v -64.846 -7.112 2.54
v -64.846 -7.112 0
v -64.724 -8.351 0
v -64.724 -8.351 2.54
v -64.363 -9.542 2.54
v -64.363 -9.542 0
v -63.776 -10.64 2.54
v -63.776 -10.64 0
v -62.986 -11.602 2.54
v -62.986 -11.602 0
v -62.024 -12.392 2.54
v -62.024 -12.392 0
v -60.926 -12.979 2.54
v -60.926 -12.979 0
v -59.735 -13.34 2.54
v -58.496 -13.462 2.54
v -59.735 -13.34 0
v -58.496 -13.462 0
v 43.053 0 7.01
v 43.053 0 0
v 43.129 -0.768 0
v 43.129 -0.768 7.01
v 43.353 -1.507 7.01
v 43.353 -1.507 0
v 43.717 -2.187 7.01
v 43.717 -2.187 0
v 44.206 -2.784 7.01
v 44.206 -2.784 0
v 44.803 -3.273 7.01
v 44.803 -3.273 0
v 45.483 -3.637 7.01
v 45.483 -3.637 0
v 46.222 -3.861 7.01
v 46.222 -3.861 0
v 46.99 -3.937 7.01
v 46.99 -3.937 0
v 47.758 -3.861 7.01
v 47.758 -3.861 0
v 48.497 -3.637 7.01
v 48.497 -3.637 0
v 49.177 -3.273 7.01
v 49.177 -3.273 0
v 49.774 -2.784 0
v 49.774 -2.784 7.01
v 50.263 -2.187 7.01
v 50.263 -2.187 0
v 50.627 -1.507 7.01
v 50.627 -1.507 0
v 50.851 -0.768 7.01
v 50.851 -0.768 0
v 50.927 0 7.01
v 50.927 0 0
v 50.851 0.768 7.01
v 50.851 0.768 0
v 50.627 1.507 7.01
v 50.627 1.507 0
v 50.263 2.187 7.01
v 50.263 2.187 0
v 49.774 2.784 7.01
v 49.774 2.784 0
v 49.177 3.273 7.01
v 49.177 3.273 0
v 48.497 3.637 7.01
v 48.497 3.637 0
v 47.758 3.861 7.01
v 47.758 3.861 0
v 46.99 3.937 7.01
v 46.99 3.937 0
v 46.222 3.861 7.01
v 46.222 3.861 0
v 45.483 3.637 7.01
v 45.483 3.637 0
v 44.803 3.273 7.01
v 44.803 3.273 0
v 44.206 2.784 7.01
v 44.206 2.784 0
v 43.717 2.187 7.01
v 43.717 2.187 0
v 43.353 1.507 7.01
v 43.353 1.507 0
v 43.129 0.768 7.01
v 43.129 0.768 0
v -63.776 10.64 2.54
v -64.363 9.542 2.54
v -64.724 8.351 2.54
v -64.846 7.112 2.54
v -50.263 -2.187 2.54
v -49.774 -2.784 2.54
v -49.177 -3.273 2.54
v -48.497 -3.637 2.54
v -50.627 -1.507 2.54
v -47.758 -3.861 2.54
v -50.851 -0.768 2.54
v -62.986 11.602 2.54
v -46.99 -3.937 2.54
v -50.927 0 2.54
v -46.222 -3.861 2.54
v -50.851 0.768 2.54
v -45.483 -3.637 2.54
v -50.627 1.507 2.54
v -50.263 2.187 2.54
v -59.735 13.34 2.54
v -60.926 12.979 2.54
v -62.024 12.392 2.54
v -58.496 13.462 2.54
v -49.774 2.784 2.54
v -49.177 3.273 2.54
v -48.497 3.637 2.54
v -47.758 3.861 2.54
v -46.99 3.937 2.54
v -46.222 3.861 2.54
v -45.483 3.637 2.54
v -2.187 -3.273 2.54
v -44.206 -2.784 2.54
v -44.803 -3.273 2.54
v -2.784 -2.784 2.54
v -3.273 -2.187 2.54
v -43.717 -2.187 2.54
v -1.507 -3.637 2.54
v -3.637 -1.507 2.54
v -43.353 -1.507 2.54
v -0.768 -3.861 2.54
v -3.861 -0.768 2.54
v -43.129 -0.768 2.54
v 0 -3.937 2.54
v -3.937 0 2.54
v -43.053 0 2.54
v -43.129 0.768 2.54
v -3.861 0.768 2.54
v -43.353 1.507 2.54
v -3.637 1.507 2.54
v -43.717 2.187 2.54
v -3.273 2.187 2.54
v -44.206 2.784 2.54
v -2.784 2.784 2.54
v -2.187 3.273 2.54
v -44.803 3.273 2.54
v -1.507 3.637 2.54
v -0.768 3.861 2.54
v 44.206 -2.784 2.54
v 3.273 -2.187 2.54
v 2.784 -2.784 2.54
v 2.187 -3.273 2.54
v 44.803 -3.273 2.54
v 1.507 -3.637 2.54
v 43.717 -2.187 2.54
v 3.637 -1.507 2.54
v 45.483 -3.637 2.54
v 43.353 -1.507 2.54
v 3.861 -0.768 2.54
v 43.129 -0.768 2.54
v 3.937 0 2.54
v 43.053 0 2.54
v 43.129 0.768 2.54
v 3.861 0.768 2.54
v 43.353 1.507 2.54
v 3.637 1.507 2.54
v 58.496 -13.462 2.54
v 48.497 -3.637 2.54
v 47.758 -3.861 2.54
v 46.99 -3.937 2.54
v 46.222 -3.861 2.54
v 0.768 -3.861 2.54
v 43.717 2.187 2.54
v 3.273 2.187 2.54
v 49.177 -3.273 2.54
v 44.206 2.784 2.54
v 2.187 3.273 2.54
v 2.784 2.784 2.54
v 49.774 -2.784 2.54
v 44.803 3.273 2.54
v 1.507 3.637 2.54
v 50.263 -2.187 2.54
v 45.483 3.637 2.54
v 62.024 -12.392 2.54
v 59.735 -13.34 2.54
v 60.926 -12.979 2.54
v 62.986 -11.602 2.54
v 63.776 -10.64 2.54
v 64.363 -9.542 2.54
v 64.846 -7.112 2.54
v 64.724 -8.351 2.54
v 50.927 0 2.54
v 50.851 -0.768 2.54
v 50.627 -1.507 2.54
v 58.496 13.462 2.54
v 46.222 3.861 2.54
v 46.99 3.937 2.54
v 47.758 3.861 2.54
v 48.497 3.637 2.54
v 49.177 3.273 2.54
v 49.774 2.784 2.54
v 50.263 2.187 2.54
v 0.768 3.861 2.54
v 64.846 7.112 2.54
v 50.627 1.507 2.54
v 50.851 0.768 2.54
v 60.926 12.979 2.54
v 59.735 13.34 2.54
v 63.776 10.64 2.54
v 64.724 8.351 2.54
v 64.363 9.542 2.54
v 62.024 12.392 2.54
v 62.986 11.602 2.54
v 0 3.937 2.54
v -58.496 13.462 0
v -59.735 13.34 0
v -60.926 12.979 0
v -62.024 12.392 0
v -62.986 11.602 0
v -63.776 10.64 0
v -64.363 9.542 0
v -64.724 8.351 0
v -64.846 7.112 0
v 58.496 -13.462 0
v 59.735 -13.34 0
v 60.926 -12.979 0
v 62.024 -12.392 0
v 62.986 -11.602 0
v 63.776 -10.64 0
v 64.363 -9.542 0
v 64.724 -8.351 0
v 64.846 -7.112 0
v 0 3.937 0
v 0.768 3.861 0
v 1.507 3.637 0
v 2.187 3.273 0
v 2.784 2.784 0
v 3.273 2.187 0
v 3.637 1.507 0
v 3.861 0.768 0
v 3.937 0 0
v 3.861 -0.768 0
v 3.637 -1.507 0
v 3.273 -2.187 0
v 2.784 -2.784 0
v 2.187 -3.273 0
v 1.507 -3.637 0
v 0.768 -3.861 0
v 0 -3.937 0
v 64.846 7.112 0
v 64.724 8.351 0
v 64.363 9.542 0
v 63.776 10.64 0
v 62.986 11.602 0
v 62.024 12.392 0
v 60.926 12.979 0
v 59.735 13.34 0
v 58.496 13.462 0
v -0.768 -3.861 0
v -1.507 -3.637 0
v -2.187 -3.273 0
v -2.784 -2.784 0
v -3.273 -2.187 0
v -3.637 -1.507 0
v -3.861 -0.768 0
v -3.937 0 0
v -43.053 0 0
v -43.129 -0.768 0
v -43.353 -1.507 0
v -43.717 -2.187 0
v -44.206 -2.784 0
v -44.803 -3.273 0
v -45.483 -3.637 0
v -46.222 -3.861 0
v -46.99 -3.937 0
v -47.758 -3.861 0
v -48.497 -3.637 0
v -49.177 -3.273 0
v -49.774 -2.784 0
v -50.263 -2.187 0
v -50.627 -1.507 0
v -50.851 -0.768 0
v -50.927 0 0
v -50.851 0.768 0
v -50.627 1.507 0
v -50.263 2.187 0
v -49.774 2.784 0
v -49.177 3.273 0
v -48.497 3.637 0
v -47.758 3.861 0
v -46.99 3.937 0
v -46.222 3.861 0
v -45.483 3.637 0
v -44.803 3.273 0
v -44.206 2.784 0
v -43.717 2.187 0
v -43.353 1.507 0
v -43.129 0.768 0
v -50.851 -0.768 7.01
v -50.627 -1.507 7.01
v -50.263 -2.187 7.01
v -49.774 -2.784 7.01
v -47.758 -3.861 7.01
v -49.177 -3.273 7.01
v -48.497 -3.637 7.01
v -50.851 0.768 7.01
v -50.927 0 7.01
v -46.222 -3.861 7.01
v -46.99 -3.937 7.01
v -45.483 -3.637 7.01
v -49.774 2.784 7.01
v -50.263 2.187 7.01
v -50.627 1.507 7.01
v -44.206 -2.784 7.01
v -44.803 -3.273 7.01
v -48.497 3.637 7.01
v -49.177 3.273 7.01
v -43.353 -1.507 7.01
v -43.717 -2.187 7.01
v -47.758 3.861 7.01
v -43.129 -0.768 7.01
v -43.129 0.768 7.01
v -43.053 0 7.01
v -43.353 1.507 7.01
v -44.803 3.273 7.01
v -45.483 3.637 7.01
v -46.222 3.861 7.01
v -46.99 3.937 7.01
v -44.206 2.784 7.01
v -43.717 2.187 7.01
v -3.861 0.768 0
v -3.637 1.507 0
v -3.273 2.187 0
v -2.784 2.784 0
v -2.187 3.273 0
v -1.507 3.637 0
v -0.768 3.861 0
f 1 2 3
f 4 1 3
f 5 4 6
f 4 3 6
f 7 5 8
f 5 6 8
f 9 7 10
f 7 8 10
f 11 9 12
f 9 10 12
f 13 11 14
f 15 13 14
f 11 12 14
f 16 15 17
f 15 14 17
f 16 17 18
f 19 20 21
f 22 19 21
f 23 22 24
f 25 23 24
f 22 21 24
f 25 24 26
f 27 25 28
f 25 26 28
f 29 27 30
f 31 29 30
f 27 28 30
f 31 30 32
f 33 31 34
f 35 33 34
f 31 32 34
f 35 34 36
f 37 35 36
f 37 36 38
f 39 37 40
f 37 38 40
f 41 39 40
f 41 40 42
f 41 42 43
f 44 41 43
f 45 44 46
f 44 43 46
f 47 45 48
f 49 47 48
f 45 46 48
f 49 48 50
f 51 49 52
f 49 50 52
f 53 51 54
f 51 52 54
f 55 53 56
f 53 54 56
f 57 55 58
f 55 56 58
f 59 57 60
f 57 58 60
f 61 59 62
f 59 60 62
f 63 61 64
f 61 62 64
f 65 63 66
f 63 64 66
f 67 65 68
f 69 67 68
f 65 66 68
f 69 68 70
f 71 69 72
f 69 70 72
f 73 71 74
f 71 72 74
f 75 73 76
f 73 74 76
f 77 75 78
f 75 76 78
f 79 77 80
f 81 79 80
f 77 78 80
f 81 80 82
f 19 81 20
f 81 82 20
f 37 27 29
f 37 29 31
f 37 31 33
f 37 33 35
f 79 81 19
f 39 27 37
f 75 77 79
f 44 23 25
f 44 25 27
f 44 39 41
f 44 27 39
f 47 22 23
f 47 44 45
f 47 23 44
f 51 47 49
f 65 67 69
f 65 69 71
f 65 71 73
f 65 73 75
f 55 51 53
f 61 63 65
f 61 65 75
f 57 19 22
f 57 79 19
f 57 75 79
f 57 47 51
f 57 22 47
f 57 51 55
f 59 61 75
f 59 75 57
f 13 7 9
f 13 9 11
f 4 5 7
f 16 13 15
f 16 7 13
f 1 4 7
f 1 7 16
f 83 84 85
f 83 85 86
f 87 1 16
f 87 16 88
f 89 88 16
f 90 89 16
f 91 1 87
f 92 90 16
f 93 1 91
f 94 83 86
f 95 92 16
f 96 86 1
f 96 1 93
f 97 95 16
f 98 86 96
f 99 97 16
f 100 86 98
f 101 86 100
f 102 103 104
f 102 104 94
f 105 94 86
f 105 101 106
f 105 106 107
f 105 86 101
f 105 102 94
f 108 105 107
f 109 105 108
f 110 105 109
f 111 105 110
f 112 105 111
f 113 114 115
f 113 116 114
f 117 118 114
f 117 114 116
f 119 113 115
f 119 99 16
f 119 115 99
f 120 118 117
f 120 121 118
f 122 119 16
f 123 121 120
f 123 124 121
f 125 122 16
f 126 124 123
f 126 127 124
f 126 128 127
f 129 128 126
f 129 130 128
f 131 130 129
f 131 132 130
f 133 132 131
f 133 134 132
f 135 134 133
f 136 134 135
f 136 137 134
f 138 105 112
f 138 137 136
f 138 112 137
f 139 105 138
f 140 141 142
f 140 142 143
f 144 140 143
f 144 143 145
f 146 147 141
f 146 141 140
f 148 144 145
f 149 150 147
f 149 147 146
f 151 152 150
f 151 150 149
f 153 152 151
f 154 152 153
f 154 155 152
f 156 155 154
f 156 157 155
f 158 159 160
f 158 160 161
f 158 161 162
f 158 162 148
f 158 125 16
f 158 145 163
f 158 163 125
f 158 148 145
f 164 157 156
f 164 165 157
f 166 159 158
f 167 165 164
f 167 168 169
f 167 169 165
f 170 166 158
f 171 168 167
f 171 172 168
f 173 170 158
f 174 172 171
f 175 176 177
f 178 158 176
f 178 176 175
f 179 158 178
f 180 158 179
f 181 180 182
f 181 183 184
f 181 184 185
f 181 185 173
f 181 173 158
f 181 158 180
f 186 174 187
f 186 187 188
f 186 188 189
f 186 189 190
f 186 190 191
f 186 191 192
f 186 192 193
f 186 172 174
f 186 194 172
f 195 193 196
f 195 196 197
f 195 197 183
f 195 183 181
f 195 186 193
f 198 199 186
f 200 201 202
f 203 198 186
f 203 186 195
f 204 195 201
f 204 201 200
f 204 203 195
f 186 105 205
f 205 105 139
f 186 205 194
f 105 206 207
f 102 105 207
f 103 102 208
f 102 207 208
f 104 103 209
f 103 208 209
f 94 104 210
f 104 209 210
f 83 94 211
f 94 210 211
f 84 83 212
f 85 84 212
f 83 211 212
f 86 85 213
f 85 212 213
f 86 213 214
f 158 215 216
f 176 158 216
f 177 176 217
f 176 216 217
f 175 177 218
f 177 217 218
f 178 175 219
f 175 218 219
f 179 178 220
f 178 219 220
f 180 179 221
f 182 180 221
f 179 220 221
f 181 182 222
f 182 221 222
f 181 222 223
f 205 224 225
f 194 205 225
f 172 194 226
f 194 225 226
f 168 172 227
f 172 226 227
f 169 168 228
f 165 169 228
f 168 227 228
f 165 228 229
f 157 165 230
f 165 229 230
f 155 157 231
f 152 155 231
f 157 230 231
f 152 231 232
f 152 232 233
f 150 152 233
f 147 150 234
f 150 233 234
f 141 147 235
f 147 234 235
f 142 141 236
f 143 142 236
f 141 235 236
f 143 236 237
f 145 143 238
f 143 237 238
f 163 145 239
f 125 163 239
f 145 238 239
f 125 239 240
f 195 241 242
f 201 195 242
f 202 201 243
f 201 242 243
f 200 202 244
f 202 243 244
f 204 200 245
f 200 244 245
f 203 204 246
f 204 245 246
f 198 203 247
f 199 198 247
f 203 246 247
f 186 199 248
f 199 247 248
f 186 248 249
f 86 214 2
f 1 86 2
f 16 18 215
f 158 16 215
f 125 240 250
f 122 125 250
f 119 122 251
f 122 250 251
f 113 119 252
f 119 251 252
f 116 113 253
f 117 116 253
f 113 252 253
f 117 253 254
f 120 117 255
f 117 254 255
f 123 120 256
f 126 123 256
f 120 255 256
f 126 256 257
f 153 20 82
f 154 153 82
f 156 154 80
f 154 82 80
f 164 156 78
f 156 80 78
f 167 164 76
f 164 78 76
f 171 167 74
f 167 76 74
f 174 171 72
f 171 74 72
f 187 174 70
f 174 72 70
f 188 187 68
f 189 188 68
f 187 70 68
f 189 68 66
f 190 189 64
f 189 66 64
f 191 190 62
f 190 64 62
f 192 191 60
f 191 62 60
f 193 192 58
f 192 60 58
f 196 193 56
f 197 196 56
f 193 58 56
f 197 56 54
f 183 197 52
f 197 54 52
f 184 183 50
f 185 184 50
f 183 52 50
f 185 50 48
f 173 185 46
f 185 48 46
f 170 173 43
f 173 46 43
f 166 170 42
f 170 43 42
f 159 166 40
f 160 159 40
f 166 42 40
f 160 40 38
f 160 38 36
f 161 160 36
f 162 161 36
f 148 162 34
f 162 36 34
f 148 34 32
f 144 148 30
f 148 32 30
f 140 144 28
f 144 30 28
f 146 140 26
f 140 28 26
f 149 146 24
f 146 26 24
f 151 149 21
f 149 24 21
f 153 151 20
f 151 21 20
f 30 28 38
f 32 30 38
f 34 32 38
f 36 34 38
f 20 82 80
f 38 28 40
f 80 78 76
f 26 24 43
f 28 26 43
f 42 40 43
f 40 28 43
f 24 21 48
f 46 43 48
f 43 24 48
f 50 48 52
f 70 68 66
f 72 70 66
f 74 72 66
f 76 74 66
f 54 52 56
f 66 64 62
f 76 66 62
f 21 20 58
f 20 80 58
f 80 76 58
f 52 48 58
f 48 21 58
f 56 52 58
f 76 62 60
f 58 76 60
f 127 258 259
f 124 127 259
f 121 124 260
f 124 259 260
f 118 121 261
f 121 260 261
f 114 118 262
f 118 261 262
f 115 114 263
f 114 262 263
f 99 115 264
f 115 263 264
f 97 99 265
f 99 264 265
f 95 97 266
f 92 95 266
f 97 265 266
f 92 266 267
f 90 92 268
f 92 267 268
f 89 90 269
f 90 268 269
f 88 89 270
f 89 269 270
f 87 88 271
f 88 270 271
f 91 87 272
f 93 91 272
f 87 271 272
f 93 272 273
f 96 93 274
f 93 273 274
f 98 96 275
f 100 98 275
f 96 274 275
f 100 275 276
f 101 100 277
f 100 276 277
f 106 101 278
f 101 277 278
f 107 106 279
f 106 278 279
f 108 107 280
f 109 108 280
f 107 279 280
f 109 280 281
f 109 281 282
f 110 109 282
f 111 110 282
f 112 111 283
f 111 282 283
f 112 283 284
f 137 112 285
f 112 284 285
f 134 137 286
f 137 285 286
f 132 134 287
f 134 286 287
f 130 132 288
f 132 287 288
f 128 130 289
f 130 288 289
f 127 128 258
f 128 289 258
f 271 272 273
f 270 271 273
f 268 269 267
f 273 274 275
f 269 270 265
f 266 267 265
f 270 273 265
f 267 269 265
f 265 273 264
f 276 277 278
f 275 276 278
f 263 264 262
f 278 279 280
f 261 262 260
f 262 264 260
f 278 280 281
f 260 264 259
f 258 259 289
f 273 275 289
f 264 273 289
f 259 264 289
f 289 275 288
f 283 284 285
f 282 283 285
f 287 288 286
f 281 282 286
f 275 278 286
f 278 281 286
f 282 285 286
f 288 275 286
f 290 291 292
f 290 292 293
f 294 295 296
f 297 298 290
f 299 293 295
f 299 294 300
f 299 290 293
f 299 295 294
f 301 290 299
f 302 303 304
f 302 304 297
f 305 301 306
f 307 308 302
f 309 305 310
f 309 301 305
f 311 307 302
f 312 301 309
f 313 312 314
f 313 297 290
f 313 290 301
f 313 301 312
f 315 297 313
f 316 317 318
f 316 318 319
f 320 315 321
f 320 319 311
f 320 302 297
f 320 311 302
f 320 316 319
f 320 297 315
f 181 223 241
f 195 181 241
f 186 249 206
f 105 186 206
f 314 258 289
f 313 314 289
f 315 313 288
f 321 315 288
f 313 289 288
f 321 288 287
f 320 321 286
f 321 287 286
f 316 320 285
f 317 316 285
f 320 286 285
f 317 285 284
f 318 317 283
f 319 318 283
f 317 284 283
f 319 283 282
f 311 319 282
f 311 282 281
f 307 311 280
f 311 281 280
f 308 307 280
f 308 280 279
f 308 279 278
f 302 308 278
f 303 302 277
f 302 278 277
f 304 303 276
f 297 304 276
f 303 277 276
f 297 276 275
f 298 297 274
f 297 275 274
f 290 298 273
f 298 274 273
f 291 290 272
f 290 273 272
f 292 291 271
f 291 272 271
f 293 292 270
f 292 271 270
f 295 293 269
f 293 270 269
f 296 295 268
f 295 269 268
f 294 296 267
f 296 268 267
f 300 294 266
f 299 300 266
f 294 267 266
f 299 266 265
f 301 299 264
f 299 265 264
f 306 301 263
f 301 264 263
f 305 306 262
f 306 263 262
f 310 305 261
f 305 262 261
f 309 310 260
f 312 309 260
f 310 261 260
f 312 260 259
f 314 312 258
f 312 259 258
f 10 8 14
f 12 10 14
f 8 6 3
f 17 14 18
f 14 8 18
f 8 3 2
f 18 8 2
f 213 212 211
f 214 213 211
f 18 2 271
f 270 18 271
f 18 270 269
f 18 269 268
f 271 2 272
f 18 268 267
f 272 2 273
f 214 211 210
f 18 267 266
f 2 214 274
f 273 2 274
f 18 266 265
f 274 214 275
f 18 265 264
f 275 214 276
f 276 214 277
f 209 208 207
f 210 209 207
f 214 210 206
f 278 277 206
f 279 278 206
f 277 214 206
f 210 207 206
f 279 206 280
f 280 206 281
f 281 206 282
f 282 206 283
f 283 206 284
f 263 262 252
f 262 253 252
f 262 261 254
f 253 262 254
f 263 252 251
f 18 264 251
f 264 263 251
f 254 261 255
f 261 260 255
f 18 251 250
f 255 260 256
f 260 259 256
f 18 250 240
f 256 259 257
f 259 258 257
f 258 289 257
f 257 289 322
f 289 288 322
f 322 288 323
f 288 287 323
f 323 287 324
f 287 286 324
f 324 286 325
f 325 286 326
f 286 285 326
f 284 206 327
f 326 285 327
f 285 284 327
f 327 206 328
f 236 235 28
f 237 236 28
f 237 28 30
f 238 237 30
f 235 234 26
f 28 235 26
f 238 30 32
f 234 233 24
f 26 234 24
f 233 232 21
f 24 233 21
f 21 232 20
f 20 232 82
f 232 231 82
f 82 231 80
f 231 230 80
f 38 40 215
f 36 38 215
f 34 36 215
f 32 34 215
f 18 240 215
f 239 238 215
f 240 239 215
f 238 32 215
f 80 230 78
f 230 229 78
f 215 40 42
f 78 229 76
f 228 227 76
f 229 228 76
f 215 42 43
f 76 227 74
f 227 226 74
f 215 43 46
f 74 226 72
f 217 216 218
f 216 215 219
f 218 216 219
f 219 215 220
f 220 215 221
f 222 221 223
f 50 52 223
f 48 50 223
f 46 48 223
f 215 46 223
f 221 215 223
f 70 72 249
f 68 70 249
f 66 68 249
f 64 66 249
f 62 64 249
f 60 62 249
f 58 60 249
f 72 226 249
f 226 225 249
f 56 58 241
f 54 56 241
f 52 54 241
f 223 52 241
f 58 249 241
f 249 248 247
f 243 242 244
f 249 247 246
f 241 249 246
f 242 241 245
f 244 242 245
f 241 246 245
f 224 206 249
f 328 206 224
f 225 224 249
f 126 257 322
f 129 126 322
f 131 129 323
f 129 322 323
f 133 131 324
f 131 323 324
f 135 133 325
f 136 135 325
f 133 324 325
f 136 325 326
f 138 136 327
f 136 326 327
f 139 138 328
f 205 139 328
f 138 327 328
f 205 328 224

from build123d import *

# Parameters (mm, degrees)
F1_DEPTH = 7.0104
F2_DEPTH = 2.54


with BuildPart() as f1:
    # F0 (on Top) → F1 (new body)
    with BuildSketch(Plane.XY):
        with BuildLine():
            ThreePointArc((50.927, 0), (46.99, 3.937), (43.053, 0))
            ThreePointArc((43.053, 0), (46.99, -3.937), (50.927, 0))
        make_face()
    extrude(amount=F1_DEPTH)


with BuildPart() as f1b:
    # F0 (on Top) → F1, piece 2 (new body)
    with BuildSketch(Plane.XY):
        with BuildLine():
            ThreePointArc((-50.927, 0), (-46.99, -3.937), (-43.053, 0))
            ThreePointArc((-43.053, 0), (-46.99, 3.937), (-50.927, 0))
        make_face()
    extrude(amount=F1_DEPTH)


with BuildPart() as f2:
    # F0 (on Top) → F2 (new body)
    with BuildSketch(Plane.XY):
        with BuildLine():
            Line((43.053, 0), (3.937, 0))
            ThreePointArc((3.937, 0), (2.7838793975, -2.7838793975), (0, -3.937))
            Line((0, -3.937), (0, -13.462))
            Line((0, -13.462), (58.4962, -13.462))
            ThreePointArc((58.4962, -13.462), (62.9863280605, -11.6021280605), (64.8462, -7.112))
            Line((64.8462, -7.112), (64.8462, 0))
            Line((64.8462, 0), (50.927, 0))
            ThreePointArc((50.927, 0), (46.99, -3.937), (43.053, 0))
        make_face()
        with BuildLine():
            ThreePointArc((0, 3.937), (2.7838793975, 2.7838793975), (3.937, 0))
            Line((3.937, 0), (43.053, 0))
            ThreePointArc((43.053, 0), (46.99, 3.937), (50.927, 0))
            Line((50.927, 0), (64.8462, 0))
            Line((64.8462, 0), (64.8462, 7.112))
            ThreePointArc((64.8462, 7.112), (62.9863280605, 11.6021280605), (58.4962, 13.462))
            Line((58.4962, 13.462), (0, 13.462))
            Line((0, 13.462), (0, 3.937))
        make_face()
        with BuildLine():
            ThreePointArc((-3.937, 0), (-2.7838793975, 2.7838793975), (0, 3.937))
            Line((0, 3.937), (0, 13.462))
            Line((0, 13.462), (-58.4962, 13.462))
            ThreePointArc((-58.4962, 13.462), (-62.9863280605, 11.6021280605), (-64.8462, 7.112))
            Line((-64.8462, 7.112), (-64.8462, 0))
            Line((-64.8462, 0), (-50.927, 0))
            ThreePointArc((-50.927, 0), (-46.99, 3.937), (-43.053, 0))
            Line((-43.053, 0), (-3.937, 0))
        make_face()
        with BuildLine():
            Line((0, -13.462), (0, -3.937))
            ThreePointArc((0, -3.937), (-2.7838793975, -2.7838793975), (-3.937, 0))
            Line((-3.937, 0), (-43.053, 0))
            ThreePointArc((-43.053, 0), (-46.99, -3.937), (-50.927, 0))
            Line((-50.927, 0), (-64.8462, 0))
            Line((-64.8462, 0), (-64.8462, -7.112))
            ThreePointArc((-64.8462, -7.112), (-62.9863280605, -11.6021280605), (-58.4962, -13.462))
            Line((-58.4962, -13.462), (0, -13.462))
        make_face()
    extrude(amount=F2_DEPTH)


solid = Compound([f1.part, f1b.part, f2.part])
